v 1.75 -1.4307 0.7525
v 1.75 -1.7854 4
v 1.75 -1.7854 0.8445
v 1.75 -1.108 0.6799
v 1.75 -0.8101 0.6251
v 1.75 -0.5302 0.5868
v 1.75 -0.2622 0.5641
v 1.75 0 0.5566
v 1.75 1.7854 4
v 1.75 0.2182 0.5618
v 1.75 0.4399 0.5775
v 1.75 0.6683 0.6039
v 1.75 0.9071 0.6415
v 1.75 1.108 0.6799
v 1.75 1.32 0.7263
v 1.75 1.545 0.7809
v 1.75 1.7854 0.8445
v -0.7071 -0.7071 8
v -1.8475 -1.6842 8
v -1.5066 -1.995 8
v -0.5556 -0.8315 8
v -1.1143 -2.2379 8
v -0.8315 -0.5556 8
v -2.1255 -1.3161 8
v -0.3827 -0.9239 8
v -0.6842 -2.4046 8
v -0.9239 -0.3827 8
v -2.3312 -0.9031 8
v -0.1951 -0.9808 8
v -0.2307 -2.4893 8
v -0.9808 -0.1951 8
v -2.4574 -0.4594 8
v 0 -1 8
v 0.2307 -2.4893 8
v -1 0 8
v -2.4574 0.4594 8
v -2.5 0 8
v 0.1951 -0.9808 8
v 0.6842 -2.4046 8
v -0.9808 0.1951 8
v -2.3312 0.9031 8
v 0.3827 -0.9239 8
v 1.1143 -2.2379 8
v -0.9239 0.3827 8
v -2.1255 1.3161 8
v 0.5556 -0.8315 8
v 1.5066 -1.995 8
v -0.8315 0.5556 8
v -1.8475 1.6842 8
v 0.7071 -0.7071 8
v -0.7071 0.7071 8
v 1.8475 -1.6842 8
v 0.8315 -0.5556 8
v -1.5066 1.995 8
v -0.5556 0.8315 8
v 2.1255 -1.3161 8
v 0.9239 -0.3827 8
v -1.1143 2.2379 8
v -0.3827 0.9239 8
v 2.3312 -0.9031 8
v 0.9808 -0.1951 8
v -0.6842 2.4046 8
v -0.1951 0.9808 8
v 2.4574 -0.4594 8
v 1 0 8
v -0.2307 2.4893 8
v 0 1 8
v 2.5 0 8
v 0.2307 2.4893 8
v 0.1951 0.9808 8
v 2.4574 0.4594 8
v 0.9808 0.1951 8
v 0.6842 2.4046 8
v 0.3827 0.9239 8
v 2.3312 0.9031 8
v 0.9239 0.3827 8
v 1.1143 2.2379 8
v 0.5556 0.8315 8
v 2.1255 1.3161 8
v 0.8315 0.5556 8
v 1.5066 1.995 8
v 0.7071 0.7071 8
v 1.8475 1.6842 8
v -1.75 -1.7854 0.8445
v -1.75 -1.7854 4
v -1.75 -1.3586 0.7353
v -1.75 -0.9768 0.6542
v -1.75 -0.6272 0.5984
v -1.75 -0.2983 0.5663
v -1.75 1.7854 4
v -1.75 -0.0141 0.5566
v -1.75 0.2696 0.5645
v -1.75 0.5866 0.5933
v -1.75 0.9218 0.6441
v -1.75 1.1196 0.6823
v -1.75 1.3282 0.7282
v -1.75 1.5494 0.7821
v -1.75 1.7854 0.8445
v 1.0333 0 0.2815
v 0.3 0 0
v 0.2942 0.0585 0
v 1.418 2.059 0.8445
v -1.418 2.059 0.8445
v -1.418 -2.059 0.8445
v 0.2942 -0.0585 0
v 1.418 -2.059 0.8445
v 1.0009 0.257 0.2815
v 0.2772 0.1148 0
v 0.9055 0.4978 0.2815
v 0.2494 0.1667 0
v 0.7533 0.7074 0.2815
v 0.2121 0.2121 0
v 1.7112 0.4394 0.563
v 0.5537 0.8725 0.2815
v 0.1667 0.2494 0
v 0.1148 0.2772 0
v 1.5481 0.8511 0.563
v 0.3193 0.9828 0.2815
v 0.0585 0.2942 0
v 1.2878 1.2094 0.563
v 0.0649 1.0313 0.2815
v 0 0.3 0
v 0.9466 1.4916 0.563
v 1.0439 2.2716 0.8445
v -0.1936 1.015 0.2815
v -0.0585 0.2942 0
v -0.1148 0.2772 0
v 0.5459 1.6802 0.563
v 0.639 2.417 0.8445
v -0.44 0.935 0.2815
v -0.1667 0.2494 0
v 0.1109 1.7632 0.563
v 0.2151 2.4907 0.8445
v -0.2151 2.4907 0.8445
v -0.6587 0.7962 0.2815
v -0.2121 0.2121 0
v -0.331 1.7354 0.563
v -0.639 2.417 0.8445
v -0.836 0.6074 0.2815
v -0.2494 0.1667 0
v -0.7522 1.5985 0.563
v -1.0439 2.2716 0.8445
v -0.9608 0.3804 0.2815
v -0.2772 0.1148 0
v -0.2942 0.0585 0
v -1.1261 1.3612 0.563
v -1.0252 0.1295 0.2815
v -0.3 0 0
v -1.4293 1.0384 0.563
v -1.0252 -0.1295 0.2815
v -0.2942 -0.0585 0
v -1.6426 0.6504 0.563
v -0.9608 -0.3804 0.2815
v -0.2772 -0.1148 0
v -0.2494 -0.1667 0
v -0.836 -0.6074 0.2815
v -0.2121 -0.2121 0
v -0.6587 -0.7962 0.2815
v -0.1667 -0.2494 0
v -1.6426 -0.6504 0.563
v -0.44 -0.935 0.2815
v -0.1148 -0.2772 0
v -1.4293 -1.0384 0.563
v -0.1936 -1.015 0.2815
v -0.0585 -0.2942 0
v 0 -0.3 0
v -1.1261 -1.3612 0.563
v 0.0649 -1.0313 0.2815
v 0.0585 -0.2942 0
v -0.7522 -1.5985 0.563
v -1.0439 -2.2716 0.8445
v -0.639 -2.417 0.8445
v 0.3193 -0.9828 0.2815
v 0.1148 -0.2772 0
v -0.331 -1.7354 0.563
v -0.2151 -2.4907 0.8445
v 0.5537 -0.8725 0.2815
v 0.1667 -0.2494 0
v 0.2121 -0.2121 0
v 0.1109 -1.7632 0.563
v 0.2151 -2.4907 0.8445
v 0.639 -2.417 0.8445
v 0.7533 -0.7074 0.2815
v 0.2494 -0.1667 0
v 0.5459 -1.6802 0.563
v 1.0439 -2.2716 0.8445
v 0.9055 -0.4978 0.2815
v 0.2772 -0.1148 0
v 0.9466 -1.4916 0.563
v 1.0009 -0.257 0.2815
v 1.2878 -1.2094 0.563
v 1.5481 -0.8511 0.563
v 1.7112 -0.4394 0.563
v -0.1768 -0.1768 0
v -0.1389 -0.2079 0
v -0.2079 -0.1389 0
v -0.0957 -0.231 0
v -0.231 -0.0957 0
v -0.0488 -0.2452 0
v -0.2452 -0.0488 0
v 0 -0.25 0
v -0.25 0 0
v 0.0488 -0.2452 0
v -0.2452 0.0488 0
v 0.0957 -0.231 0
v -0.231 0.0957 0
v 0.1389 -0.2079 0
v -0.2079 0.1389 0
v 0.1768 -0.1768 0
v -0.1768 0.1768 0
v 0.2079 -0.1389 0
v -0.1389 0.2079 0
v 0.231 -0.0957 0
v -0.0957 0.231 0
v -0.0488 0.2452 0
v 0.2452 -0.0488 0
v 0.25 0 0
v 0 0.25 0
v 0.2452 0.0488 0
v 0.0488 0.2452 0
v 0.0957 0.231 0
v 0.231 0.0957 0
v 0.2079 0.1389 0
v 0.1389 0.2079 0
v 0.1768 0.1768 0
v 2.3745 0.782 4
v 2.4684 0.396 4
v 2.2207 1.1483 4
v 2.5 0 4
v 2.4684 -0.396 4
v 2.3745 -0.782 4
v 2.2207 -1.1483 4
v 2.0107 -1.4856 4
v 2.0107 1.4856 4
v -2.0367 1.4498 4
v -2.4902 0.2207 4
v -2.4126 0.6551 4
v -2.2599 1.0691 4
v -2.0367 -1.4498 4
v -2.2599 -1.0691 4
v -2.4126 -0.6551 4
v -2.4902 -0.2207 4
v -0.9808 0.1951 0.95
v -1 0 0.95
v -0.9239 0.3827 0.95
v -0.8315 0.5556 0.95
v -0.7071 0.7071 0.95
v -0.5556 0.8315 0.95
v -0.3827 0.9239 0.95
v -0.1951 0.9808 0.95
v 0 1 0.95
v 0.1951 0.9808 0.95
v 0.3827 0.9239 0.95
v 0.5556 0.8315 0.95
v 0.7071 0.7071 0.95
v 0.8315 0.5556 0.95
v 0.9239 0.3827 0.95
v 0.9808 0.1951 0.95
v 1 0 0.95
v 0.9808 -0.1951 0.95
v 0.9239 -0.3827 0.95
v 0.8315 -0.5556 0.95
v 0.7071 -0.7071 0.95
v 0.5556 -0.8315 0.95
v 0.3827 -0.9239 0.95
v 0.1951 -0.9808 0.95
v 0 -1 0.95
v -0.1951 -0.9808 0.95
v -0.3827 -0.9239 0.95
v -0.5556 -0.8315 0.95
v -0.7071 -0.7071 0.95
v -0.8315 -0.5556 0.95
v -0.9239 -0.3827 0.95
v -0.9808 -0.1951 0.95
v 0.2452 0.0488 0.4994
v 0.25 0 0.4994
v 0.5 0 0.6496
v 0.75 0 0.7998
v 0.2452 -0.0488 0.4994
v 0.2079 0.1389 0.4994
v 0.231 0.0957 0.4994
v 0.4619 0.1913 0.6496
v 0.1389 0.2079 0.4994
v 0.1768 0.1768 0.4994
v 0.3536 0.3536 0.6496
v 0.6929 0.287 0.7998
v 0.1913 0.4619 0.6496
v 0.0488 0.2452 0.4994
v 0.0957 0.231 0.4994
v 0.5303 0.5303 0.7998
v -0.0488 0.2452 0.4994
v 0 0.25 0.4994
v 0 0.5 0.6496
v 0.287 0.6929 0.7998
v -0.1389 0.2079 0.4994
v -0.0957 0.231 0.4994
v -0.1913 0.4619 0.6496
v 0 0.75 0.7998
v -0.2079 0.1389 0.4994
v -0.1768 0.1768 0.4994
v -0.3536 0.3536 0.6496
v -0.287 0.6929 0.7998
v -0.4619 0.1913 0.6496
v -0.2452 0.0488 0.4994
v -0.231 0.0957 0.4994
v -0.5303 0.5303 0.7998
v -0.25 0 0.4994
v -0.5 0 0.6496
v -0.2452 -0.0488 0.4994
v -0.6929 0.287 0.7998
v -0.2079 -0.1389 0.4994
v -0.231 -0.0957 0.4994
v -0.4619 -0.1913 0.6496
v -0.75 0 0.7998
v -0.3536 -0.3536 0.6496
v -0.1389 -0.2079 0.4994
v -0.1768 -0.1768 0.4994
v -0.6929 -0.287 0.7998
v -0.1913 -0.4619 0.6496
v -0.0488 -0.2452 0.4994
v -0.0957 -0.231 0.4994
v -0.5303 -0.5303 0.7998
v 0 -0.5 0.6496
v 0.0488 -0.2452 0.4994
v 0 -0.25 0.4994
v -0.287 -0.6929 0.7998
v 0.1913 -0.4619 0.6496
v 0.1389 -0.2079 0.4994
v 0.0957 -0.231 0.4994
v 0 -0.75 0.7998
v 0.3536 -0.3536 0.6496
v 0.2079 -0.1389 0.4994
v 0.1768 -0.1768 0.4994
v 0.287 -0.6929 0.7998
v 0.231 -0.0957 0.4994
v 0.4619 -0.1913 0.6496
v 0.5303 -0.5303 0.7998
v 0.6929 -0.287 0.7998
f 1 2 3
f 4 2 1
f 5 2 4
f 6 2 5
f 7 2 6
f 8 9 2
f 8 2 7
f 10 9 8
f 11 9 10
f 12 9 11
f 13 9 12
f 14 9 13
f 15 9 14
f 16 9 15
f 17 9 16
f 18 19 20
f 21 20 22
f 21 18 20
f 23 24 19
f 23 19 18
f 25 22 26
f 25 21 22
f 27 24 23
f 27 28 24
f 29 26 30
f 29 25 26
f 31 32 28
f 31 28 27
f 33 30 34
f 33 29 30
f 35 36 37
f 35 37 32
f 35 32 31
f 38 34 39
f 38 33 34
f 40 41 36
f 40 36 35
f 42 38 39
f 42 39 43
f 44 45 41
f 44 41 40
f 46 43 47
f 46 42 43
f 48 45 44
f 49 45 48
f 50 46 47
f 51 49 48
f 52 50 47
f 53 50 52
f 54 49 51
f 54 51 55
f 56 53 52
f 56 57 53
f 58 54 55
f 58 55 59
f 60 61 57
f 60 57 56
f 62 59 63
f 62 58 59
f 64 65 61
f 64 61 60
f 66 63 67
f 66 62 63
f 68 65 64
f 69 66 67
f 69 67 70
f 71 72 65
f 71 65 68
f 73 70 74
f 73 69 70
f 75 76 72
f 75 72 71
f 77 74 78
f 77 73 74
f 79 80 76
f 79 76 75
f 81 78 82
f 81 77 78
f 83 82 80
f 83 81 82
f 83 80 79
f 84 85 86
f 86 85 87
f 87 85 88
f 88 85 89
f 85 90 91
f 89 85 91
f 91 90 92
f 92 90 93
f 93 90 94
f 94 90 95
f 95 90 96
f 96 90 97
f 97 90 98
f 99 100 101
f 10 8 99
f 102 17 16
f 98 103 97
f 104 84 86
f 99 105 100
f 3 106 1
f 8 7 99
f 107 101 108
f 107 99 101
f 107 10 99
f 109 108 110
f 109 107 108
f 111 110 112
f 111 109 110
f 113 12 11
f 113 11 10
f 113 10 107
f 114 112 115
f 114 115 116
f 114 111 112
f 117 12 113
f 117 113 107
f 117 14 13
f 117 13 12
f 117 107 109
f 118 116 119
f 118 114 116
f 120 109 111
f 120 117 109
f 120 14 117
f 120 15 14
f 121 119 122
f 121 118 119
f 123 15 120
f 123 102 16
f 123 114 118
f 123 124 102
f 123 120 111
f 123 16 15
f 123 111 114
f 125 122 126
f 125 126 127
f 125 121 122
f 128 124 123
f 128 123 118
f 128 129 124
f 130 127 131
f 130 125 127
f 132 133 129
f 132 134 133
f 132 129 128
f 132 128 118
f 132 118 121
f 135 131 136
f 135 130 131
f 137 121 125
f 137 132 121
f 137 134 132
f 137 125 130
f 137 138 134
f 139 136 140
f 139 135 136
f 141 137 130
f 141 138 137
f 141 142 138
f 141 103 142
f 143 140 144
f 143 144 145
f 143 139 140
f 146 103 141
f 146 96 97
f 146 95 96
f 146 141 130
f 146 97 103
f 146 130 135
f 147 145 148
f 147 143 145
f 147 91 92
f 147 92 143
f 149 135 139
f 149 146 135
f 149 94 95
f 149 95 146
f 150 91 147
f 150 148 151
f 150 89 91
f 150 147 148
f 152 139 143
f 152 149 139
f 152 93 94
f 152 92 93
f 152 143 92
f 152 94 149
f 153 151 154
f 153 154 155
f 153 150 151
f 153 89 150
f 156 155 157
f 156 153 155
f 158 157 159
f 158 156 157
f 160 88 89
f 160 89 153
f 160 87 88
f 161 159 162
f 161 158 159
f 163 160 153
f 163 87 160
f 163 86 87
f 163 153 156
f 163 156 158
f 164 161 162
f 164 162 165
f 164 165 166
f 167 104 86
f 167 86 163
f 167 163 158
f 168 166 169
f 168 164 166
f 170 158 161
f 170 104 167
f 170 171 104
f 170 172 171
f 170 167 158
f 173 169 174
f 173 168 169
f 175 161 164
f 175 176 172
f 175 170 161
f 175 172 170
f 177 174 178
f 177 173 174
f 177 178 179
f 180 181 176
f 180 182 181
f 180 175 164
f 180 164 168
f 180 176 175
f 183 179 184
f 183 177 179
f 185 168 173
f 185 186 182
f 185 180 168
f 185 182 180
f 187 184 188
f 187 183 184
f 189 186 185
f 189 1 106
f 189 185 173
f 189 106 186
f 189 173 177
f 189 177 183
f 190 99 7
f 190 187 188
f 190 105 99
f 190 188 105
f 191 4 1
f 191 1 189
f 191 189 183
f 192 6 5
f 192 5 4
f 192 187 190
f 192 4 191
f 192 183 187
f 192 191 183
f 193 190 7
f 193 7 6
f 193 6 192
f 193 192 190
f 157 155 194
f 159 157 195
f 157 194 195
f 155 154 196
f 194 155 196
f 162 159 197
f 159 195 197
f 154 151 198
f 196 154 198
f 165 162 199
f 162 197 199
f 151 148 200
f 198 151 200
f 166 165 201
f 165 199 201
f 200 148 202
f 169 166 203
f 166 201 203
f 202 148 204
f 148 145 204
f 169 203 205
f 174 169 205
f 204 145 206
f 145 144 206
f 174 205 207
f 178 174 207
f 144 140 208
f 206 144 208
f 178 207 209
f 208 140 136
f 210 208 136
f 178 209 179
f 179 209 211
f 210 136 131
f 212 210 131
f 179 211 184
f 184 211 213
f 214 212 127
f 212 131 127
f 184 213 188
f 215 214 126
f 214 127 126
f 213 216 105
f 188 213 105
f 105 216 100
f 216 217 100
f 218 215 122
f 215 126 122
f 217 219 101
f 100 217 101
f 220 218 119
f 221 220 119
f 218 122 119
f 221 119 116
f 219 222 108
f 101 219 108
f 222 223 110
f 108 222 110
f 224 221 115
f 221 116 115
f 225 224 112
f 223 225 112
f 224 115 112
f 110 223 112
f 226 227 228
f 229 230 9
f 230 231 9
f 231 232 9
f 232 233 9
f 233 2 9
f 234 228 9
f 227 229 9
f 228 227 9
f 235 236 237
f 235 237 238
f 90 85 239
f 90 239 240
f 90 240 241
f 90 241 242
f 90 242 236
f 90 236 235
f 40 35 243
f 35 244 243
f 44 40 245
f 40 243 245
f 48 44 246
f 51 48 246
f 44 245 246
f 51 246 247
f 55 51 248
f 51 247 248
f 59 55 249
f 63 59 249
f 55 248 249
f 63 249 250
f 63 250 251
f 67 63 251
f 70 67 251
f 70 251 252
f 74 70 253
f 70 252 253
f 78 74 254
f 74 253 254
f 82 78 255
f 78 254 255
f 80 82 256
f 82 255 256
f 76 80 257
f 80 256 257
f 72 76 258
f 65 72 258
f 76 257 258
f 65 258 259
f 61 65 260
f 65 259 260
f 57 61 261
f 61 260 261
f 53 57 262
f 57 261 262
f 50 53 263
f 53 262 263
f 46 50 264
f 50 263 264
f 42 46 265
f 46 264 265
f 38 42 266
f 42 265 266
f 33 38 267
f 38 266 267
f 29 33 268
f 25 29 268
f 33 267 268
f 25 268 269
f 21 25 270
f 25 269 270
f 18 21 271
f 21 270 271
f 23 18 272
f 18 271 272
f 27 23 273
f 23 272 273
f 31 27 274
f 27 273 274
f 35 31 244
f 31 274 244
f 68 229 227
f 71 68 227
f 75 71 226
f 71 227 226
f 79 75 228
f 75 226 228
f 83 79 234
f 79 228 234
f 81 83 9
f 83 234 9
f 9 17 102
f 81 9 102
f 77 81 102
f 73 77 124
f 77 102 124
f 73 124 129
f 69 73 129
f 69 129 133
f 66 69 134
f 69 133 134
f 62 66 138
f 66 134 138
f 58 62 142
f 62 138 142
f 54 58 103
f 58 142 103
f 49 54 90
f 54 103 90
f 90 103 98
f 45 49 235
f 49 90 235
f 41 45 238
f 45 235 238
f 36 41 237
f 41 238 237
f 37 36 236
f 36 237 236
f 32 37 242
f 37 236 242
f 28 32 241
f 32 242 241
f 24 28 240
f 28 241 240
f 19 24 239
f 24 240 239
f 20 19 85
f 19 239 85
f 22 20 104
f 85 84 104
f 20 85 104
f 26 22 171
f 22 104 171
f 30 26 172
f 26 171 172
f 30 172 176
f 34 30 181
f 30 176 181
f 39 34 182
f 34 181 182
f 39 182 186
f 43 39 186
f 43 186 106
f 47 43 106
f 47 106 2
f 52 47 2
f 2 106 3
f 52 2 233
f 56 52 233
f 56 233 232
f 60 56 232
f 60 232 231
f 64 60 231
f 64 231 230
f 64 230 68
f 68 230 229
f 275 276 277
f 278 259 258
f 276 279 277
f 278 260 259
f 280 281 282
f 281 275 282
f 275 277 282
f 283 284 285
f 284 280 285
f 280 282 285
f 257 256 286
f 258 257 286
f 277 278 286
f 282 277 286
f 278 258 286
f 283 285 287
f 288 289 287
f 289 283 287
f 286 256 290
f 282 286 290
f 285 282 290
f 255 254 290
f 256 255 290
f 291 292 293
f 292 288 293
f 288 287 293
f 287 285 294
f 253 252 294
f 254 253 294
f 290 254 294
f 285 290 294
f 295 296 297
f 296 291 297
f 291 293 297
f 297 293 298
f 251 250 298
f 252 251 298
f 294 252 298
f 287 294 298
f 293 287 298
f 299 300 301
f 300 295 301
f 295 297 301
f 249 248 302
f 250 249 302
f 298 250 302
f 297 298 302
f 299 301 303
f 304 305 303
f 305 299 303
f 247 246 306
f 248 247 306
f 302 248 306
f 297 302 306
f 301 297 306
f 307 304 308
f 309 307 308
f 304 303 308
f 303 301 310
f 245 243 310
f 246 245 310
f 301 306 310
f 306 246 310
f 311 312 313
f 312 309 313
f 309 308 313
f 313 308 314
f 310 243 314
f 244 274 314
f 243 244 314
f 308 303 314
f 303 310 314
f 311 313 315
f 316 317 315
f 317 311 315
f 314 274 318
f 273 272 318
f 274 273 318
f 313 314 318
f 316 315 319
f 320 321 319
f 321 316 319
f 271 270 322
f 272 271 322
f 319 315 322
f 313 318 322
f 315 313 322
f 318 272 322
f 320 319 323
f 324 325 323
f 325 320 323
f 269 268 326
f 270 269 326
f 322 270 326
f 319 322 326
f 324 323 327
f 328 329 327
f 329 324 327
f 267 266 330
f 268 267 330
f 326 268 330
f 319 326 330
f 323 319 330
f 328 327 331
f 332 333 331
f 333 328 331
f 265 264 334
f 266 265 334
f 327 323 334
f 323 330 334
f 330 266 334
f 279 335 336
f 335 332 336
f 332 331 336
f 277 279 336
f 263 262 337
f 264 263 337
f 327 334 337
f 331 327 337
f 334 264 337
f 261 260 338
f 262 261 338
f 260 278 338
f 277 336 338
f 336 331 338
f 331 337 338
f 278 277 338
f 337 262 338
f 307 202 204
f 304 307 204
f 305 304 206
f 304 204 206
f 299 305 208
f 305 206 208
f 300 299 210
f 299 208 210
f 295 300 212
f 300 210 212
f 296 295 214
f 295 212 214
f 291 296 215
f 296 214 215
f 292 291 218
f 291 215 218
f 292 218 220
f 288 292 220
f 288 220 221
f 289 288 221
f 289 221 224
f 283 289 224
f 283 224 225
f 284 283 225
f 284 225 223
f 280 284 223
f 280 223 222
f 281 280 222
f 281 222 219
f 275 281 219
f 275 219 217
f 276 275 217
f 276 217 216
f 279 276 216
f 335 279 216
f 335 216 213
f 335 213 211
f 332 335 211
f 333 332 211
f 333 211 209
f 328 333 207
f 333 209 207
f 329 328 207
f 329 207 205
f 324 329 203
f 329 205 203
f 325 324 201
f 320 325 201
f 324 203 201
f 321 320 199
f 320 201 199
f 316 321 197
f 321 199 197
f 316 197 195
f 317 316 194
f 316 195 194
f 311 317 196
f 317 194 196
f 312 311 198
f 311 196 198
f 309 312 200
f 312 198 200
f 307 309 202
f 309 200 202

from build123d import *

# Parameters (mm, degrees)
SKETCH1_R                    = 2.5
BOSS_EXTRUDE1_DEPTH          = 8
SKETCH6_R                    = 0.25
CUT_EXTRUDE1_DEPTH           = 1
CHAMFER1_SIZE                = 2.2
CHAMFER1_SIZE2               = 0.844500877
SKETCH7_W                    = 1.688266385
SKETCH7_H                    = 5.007188161
CUT_EXTRUDE2_DEPTH           = 5
F_2_0_2_DIAMETER_HOLE1_D     = 2
F_2_0_2_DIAMETER_HOLE1_DEPTH = 7.05
F_2_0_2_DIAMETER_HOLE1_TIP   = 0.600860619


with BuildPart() as part:
    # Sketch1 → Boss-Extrude1 (new body)
    with BuildSketch(Plane.XY):
        Circle(SKETCH1_R)
    extrude(amount=BOSS_EXTRUDE1_DEPTH)

    # Sketch6 → Cut-Extrude1 (cut)
    with BuildSketch(Plane(origin=(0, 0, 0), x_dir=(-1, 0, 0), z_dir=(0, 0, -1))):
        Circle(SKETCH6_R)
    extrude(amount=-CUT_EXTRUDE1_DEPTH, mode=Mode.SUBTRACT)

    # Chamfer1
    chamfer1_edges = [part.edges().sort_by_distance(p)[0] for p in [
        (-2.5, 0, 0),
    ]]
    chamfer1_side = [part.faces().sort_by_distance(p)[0] for p in [
        (-2.429289322, 0, 0),
    ]]
    chamfer(chamfer1_edges, length=CHAMFER1_SIZE, length2=CHAMFER1_SIZE2, reference=chamfer1_side[0])

    # Sketch7 → Cut-Extrude2 (cut, symmetric)
    with BuildSketch(Plane(origin=(0, 0, 0), x_dir=(1, 0, 0), z_dir=(0, 1, 0))):
        with Locations((2.594133193, -1.496405919)):
            Rectangle(SKETCH7_W, SKETCH7_H)
    cut_extrude2 = extrude(amount=CUT_EXTRUDE2_DEPTH, both=True, mode=Mode.SUBTRACT)

    # Mirror1: Cut-Extrude2 across plane
    add(cut_extrude2.mirror(Plane(origin=(0, 0, 0), x_dir=(0, 0, 1), z_dir=(1, 0, 0))), mode=Mode.SUBTRACT)

    # Ø2.0 (2) Diameter Hole1
    with Locations(Plane.XY.offset(8)):
        with Locations((0, 0)):
            Hole(F_2_0_2_DIAMETER_HOLE1_D / 2, depth=F_2_0_2_DIAMETER_HOLE1_DEPTH)
            with Locations((0, 0, -(F_2_0_2_DIAMETER_HOLE1_DEPTH + F_2_0_2_DIAMETER_HOLE1_TIP / 2))):  # 118° drill point
                Cone(0, F_2_0_2_DIAMETER_HOLE1_D / 2, F_2_0_2_DIAMETER_HOLE1_TIP, mode=Mode.SUBTRACT)


solid = part.part
